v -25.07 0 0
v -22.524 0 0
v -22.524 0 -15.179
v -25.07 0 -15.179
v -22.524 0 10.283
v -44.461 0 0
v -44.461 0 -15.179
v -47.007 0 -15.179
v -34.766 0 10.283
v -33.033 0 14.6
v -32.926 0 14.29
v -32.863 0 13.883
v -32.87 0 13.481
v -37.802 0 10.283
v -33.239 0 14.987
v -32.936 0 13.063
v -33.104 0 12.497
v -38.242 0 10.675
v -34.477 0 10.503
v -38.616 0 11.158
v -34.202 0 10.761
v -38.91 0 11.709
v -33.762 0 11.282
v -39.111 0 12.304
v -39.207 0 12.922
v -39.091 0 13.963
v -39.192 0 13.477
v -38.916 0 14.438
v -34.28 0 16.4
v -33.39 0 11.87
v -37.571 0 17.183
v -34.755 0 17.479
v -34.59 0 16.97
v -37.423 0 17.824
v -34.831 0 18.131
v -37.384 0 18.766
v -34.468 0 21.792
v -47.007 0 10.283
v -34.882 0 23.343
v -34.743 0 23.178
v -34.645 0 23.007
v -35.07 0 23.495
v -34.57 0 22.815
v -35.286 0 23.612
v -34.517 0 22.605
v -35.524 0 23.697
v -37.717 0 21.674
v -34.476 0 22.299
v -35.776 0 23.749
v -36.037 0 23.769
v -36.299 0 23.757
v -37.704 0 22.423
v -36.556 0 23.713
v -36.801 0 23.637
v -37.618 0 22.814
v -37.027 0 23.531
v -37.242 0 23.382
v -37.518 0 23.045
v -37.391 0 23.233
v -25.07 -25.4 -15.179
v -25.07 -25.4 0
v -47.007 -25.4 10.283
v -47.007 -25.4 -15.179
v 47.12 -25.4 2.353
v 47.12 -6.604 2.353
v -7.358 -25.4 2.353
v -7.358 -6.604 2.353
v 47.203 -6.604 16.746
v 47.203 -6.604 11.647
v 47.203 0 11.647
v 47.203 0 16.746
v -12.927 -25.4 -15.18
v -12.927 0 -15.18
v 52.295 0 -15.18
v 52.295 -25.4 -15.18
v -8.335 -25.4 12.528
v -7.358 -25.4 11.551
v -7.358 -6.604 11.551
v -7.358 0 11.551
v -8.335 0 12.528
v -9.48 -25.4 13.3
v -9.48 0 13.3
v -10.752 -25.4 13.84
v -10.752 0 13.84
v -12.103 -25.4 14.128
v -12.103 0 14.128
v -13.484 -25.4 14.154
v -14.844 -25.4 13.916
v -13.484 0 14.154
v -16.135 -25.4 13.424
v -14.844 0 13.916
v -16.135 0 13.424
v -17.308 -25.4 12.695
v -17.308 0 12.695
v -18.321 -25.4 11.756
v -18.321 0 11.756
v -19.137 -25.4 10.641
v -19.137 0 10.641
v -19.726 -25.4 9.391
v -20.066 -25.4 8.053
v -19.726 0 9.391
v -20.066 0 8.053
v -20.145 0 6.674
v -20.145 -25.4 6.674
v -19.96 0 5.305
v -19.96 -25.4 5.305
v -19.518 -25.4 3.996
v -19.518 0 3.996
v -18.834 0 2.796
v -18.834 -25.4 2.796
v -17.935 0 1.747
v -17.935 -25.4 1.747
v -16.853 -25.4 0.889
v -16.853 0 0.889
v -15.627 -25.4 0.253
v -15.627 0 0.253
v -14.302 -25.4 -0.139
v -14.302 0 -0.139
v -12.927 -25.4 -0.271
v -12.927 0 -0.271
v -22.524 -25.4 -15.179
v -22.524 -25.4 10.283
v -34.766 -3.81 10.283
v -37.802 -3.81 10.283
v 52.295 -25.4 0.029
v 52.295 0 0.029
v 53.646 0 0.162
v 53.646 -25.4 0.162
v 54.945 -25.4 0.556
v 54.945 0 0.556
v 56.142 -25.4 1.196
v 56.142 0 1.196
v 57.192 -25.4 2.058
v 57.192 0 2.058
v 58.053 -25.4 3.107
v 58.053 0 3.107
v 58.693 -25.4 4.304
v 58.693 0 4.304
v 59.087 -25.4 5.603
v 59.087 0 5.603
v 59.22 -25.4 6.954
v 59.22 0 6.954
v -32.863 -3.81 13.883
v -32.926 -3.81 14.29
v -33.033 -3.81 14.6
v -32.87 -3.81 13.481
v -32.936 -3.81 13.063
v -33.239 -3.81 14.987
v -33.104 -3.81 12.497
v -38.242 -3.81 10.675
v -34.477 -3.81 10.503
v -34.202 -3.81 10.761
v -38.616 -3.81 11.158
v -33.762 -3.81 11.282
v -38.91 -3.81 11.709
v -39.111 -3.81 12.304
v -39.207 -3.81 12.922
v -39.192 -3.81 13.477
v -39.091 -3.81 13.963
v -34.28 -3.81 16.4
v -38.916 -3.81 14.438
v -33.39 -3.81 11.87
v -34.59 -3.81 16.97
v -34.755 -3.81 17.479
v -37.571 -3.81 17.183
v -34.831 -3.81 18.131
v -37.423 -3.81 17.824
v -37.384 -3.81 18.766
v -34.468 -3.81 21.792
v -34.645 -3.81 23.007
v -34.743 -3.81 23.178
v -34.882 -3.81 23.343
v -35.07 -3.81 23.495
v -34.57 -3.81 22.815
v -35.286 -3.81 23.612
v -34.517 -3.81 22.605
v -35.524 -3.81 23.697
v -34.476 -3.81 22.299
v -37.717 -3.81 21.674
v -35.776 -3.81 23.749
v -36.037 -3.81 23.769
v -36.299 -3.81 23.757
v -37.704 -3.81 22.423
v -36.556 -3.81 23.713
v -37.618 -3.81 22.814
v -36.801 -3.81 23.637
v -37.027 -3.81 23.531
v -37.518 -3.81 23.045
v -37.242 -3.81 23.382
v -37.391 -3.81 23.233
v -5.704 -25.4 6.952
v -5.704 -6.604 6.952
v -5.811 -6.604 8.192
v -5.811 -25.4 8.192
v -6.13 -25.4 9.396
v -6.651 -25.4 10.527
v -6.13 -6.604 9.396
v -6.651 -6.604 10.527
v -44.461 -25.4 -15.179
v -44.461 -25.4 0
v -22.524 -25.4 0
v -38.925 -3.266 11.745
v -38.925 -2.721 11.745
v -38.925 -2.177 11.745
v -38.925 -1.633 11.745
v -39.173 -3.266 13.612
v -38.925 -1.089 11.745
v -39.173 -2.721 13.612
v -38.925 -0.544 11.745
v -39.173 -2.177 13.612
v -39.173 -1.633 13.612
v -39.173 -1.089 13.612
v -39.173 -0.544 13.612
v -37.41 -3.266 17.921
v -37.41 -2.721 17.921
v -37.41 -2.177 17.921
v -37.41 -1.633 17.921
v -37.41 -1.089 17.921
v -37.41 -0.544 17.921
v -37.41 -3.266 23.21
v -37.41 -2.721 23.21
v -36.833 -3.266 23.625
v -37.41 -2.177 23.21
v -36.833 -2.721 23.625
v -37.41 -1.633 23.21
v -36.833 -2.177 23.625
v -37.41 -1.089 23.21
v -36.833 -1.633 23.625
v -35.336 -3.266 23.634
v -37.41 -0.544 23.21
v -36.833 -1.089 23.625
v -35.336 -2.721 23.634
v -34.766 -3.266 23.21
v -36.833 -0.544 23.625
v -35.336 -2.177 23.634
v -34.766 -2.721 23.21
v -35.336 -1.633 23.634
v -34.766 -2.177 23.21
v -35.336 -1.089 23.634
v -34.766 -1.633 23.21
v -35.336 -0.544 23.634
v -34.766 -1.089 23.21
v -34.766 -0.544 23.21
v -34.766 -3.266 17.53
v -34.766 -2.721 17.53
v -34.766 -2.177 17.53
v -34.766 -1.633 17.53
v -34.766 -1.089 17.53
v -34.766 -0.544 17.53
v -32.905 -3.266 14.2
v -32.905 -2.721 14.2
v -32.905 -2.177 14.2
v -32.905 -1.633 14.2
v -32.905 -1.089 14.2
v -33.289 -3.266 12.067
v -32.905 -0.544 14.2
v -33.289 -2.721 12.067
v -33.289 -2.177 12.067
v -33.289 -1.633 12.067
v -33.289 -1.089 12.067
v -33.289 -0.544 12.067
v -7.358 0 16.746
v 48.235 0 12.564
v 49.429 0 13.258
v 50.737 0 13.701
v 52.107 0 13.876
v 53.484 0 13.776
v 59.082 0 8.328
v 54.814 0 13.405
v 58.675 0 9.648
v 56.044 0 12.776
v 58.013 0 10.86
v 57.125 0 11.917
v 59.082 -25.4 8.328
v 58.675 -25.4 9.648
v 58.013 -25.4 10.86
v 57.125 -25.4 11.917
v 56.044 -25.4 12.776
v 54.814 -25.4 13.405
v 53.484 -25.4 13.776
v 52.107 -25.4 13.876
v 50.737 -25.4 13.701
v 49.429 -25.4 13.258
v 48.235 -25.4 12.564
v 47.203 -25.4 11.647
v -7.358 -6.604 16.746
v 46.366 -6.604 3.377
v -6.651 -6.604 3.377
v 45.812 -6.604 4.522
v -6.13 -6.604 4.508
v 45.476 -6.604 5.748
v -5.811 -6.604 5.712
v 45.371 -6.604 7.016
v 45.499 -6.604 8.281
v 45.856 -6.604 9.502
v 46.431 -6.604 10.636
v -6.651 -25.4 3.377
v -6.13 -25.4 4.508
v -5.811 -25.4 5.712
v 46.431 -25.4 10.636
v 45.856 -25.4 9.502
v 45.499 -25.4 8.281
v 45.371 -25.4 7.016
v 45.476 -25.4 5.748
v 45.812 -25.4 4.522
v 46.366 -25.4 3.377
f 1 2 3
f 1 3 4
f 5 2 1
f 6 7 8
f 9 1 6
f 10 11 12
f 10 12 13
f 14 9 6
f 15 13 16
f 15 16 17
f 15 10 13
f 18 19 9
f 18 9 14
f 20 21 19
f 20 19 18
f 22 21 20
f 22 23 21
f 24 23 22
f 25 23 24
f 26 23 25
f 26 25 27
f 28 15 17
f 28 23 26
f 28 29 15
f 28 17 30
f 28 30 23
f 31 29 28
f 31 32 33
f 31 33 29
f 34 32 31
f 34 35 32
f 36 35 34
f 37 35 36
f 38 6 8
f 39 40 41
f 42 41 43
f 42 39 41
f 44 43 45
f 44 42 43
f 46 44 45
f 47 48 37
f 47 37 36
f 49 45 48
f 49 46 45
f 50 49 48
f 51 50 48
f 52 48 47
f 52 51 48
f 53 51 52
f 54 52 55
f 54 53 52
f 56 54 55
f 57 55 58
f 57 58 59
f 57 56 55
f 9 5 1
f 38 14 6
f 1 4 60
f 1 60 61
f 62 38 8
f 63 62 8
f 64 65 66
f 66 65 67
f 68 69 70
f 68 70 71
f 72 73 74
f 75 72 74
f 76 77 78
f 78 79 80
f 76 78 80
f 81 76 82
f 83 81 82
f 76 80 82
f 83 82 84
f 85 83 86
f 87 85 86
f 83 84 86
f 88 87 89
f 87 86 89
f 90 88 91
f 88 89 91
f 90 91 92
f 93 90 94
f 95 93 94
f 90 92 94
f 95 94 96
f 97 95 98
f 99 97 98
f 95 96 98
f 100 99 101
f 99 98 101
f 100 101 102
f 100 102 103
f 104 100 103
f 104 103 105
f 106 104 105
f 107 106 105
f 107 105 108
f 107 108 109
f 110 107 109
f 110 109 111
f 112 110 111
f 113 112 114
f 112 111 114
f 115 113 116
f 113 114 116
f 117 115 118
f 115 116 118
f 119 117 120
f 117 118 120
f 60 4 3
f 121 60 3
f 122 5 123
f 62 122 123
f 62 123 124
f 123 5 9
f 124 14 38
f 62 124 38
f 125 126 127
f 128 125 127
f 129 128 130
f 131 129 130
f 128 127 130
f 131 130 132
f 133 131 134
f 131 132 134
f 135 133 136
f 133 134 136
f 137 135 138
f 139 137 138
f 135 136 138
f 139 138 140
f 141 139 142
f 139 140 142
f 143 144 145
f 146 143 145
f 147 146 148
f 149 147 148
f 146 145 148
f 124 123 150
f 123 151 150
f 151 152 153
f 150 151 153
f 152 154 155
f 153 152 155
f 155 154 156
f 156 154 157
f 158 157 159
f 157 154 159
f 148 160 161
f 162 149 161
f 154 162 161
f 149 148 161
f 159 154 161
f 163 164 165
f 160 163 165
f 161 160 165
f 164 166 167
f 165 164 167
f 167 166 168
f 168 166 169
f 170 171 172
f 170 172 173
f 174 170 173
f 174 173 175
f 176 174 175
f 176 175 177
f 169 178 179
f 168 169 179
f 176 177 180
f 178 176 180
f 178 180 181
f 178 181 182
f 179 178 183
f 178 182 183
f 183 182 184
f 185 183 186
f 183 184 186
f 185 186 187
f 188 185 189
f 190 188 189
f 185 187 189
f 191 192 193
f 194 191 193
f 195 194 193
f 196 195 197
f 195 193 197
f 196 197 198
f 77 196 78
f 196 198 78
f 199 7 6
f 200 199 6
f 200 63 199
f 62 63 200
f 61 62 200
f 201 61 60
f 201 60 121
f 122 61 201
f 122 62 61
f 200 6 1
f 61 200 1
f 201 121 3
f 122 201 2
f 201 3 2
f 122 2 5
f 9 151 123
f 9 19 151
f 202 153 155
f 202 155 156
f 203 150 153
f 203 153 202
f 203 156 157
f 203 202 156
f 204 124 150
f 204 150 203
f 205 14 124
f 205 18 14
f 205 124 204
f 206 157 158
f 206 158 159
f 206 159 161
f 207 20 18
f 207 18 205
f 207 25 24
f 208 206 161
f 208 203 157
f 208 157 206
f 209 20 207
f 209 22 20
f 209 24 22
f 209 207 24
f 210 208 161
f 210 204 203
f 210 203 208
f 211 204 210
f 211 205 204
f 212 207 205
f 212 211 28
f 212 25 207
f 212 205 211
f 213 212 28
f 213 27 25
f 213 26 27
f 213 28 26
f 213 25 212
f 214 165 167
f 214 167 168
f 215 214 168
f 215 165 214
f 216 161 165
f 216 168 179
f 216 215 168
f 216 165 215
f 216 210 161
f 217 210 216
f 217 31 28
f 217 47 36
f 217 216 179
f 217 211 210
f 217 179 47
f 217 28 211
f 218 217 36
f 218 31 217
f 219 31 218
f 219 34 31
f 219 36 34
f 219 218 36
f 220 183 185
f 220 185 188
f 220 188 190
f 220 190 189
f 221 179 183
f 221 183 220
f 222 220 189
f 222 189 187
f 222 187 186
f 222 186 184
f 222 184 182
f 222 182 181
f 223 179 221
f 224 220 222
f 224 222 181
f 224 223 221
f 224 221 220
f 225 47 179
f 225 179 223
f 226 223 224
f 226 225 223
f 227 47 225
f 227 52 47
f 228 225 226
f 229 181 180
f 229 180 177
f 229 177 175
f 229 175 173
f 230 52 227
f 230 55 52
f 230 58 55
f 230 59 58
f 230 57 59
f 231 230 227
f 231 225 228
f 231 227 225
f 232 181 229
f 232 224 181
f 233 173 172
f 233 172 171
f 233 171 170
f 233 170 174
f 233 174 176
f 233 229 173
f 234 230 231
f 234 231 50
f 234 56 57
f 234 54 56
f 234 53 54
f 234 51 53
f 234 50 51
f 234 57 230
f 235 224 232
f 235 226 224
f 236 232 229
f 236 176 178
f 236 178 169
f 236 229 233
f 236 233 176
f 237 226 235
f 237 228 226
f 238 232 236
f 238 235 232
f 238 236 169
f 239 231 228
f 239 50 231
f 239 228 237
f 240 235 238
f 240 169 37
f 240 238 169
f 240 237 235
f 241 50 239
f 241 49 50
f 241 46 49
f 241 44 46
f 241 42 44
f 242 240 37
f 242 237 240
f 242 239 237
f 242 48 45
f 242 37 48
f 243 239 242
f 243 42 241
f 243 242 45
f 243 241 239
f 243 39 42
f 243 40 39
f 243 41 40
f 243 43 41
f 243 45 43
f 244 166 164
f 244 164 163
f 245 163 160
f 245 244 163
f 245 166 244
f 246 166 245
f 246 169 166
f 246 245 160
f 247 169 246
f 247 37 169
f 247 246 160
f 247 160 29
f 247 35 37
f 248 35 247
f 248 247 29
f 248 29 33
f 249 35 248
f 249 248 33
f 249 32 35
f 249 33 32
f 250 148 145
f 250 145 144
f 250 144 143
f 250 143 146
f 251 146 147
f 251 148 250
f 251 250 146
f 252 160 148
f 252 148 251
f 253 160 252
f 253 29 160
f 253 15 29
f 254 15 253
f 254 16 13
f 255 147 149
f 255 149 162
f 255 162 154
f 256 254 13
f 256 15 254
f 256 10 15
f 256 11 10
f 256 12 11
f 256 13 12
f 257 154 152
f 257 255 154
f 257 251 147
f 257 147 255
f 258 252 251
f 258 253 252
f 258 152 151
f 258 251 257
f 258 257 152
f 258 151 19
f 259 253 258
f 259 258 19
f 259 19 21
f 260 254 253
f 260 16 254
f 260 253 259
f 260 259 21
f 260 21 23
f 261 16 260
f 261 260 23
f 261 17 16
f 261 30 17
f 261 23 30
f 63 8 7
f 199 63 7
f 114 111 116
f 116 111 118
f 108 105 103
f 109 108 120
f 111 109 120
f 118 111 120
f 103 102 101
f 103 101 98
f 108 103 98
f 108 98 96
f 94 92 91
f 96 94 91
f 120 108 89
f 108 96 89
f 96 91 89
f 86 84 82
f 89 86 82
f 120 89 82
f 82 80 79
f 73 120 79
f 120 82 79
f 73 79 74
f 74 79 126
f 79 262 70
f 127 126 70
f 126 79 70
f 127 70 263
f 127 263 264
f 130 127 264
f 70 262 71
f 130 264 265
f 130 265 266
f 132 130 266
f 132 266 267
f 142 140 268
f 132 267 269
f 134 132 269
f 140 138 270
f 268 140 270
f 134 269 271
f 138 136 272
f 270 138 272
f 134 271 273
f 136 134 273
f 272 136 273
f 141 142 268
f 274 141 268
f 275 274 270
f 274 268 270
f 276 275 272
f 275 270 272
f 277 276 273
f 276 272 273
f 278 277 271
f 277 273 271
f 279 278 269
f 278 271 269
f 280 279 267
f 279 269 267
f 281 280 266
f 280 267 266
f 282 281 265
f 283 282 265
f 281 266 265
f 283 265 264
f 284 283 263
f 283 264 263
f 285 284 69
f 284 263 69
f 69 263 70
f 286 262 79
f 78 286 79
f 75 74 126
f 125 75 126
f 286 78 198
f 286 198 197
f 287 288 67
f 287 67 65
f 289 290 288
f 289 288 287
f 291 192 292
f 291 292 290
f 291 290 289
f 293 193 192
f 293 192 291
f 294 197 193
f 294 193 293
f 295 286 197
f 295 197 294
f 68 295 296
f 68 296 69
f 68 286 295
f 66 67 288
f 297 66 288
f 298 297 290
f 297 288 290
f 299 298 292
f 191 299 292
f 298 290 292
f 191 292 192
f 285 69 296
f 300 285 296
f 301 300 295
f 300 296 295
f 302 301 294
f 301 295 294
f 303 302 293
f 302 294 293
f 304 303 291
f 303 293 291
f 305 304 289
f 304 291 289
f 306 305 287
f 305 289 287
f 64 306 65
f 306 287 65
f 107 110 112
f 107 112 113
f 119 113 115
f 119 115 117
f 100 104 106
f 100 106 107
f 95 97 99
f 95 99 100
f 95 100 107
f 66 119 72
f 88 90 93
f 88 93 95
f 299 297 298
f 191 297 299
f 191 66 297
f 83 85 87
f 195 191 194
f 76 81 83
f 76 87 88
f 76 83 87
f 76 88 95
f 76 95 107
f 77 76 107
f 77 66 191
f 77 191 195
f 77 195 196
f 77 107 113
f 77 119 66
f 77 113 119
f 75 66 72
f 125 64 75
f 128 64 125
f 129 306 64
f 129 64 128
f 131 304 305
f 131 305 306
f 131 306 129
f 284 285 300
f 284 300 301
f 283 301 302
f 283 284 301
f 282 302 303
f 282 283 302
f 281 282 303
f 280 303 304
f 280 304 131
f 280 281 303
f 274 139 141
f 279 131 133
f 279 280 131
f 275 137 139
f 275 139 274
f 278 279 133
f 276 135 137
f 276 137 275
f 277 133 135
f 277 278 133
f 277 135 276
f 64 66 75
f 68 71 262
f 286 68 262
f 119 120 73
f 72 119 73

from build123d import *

# Parameters (mm, degrees)
F1_DEPTH = 25.4
F0_W     = 2.5462172925
F0_H     = 15.1793761179
F2_DEPTH = 6.604
F3_DEPTH = 3.81


with BuildPart() as f1:
    # F0 (on Front) → F1 (new body)
    with BuildSketch(Plane.XZ):
        with BuildLine():
            Line((-12.9270958542, -0.2709600874), (-12.9270958542, -15.1804022908))
            Line((-12.9270958542, -15.1804022908), (52.2952577884, -15.1804022908))
            Line((52.2952577884, -15.1804022908), (52.2952577884, 0.0293483804))
            ThreePointArc((52.2952577884, 0.0293483804), (49.4589338856, 0.636860971), (47.1202713733, 2.3528045839))
            Line((47.1202713733, 2.3528045839), (-7.3576150934, 2.3528045839))
            ThreePointArc((-7.3576150934, 2.3528045839), (-9.8488147999, 0.4178217266), (-12.9270958542, -0.2709600874))
        make_face()
        with BuildLine():
            ThreePointArc((-7.3576150934, 11.5514096105), (-19.4613812248, 10.0303881514), (-12.9270958542, -0.2709600874))
            ThreePointArc((-12.9270958542, -0.2709600874), (-9.8488147999, 0.4178217266), (-7.3576150934, 2.3528045839))
            ThreePointArc((-7.3576150934, 2.3528045839), (-6.1299849505, 4.5083430093), (-5.7040286695, 6.9521070972))
            ThreePointArc((-5.7040286695, 6.9521070972), (-6.1299849505, 9.3958711851), (-7.3576150934, 11.5514096105))
        make_face()
        with BuildLine():
            ThreePointArc((47.1202713733, 2.3528045839), (49.4589338856, 0.636860971), (52.2952577884, 0.0293483804))
            ThreePointArc((52.2952577884, 0.0293483804), (57.1918299275, 2.0575749696), (59.2200565167, 6.9541471087))
            ThreePointArc((59.2200565167, 6.9541471087), (54.8141561389, 13.4045725618), (47.2029596567, 11.6468368667))
            ThreePointArc((47.2029596567, 11.6468368667), (45.3707331109, 7.015754067), (47.1202713733, 2.3528045839))
        make_face()
    extrude(amount=F1_DEPTH)

    # F0 (on Front) → F2 (join)
    with BuildSketch(Plane.XZ):
        with BuildLine():
            Line((-7.3576150934, 16.7462788522), (-7.3576150934, 11.5514096105))
            ThreePointArc((-7.3576150934, 11.5514096105), (-6.1299849505, 9.3958711851), (-5.7040286695, 6.9521070972))
            ThreePointArc((-5.7040286695, 6.9521070972), (-6.1299849505, 4.5083430093), (-7.3576150934, 2.3528045839))
            Line((-7.3576150934, 2.3528045839), (47.1202713733, 2.3528045839))
            ThreePointArc((47.1202713733, 2.3528045839), (45.3707331109, 7.015754067), (47.2029596567, 11.6468368667))
            Line((47.2029596567, 11.6468368667), (47.2029596567, 16.7462788522))
            Line((47.2029596567, 16.7462788522), (-7.3576150934, 16.7462788522))
        make_face()
    extrude(amount=F2_DEPTH)


with BuildPart() as f1b:
    # F0 (on Front) → F1, piece 2 (new body)
    with BuildSketch(Plane.XZ):
        with BuildLine():
            Line((-37.801541388, 10.2828023955), (-47.007098794, 10.2828023955))
            Line((-47.007098794, 10.2828023955), (-47.007098794, 0))
            Line((-47.007098794, 0), (-44.4608815014, 0))
            Line((-44.4608815014, 0), (-25.0704530627, 0))
            Line((-25.0704530627, 0), (-22.5242357701, 0))
            Line((-22.5242357701, 0), (-22.5242357701, 10.2828023955))
            Line((-22.5242357701, 10.2828023955), (-34.765667282, 10.2828023955))
            add(Edge.make_bspline(
                [(-34.765667282, 10.2828023955), (-35.7584733948, 9.6059430556), (-36.9215104066, 9.6460140673), (-37.801541388, 10.2828023955)],
                knots=[0.8920605443, 0.8920605443, 0.8920605443, 0.8920605443, 1, 1, 1, 1], degree=3))
        make_face()
        with BuildLine():
            Line((-34.765667282, 10.2828023955), (-37.801541388, 10.2828023955))
            add(Edge.make_bspline(
                [(-34.765667282, 10.2828023955), (-35.7584733948, 9.6059430556), (-36.9215104066, 9.6460140673), (-37.801541388, 10.2828023955)],
                knots=[0.8920605443, 0.8920605443, 0.8920605443, 0.8920605443, 1, 1, 1, 1], degree=3))
        make_face()
        with Locations((-45.7339901477, -7.5896880589)):
            Rectangle(F0_W, F0_H)
        with Locations((-23.7973444164, -7.5896880589)):
            Rectangle(F0_W, F0_H)
    extrude(amount=F1_DEPTH)

    # F0 (on Front) → F3 (join)
    with BuildSketch(Plane.XZ):
        with BuildLine():
            add(Edge.make_bspline(
                [(-37.801541388, 10.2828023955), (-38.7599736077, 10.9763216736), (-40.0908364875, 13.9709710064), (-36.2154597414, 17.4726187492), (-38.9577883228, 23.8943574963), (-33.1299998967, 24.0180152523), (-36.0866597264, 16.9616831482), (-31.7508708707, 14.6440412886), (-33.5790707592, 11.0917810359), (-34.765667282, 10.2828023955)],
                knots=[0, 0, 0, 0, 0.1175556933, 0.2512234277, 0.3936845222, 0.4944197281, 0.6420629054, 0.7630518878, 0.8920605443, 0.8920605443, 0.8920605443, 0.8920605443], degree=3))
            Line((-37.801541388, 10.2828023955), (-34.765667282, 10.2828023955))
        make_face()
        with BuildLine():
            Line((-34.765667282, 10.2828023955), (-37.801541388, 10.2828023955))
            add(Edge.make_bspline(
                [(-34.765667282, 10.2828023955), (-35.7584733948, 9.6059430556), (-36.9215104066, 9.6460140673), (-37.801541388, 10.2828023955)],
                knots=[0.8920605443, 0.8920605443, 0.8920605443, 0.8920605443, 1, 1, 1, 1], degree=3))
        make_face()
    extrude(amount=F3_DEPTH)


solid = Compound([f1.part, f1b.part])
